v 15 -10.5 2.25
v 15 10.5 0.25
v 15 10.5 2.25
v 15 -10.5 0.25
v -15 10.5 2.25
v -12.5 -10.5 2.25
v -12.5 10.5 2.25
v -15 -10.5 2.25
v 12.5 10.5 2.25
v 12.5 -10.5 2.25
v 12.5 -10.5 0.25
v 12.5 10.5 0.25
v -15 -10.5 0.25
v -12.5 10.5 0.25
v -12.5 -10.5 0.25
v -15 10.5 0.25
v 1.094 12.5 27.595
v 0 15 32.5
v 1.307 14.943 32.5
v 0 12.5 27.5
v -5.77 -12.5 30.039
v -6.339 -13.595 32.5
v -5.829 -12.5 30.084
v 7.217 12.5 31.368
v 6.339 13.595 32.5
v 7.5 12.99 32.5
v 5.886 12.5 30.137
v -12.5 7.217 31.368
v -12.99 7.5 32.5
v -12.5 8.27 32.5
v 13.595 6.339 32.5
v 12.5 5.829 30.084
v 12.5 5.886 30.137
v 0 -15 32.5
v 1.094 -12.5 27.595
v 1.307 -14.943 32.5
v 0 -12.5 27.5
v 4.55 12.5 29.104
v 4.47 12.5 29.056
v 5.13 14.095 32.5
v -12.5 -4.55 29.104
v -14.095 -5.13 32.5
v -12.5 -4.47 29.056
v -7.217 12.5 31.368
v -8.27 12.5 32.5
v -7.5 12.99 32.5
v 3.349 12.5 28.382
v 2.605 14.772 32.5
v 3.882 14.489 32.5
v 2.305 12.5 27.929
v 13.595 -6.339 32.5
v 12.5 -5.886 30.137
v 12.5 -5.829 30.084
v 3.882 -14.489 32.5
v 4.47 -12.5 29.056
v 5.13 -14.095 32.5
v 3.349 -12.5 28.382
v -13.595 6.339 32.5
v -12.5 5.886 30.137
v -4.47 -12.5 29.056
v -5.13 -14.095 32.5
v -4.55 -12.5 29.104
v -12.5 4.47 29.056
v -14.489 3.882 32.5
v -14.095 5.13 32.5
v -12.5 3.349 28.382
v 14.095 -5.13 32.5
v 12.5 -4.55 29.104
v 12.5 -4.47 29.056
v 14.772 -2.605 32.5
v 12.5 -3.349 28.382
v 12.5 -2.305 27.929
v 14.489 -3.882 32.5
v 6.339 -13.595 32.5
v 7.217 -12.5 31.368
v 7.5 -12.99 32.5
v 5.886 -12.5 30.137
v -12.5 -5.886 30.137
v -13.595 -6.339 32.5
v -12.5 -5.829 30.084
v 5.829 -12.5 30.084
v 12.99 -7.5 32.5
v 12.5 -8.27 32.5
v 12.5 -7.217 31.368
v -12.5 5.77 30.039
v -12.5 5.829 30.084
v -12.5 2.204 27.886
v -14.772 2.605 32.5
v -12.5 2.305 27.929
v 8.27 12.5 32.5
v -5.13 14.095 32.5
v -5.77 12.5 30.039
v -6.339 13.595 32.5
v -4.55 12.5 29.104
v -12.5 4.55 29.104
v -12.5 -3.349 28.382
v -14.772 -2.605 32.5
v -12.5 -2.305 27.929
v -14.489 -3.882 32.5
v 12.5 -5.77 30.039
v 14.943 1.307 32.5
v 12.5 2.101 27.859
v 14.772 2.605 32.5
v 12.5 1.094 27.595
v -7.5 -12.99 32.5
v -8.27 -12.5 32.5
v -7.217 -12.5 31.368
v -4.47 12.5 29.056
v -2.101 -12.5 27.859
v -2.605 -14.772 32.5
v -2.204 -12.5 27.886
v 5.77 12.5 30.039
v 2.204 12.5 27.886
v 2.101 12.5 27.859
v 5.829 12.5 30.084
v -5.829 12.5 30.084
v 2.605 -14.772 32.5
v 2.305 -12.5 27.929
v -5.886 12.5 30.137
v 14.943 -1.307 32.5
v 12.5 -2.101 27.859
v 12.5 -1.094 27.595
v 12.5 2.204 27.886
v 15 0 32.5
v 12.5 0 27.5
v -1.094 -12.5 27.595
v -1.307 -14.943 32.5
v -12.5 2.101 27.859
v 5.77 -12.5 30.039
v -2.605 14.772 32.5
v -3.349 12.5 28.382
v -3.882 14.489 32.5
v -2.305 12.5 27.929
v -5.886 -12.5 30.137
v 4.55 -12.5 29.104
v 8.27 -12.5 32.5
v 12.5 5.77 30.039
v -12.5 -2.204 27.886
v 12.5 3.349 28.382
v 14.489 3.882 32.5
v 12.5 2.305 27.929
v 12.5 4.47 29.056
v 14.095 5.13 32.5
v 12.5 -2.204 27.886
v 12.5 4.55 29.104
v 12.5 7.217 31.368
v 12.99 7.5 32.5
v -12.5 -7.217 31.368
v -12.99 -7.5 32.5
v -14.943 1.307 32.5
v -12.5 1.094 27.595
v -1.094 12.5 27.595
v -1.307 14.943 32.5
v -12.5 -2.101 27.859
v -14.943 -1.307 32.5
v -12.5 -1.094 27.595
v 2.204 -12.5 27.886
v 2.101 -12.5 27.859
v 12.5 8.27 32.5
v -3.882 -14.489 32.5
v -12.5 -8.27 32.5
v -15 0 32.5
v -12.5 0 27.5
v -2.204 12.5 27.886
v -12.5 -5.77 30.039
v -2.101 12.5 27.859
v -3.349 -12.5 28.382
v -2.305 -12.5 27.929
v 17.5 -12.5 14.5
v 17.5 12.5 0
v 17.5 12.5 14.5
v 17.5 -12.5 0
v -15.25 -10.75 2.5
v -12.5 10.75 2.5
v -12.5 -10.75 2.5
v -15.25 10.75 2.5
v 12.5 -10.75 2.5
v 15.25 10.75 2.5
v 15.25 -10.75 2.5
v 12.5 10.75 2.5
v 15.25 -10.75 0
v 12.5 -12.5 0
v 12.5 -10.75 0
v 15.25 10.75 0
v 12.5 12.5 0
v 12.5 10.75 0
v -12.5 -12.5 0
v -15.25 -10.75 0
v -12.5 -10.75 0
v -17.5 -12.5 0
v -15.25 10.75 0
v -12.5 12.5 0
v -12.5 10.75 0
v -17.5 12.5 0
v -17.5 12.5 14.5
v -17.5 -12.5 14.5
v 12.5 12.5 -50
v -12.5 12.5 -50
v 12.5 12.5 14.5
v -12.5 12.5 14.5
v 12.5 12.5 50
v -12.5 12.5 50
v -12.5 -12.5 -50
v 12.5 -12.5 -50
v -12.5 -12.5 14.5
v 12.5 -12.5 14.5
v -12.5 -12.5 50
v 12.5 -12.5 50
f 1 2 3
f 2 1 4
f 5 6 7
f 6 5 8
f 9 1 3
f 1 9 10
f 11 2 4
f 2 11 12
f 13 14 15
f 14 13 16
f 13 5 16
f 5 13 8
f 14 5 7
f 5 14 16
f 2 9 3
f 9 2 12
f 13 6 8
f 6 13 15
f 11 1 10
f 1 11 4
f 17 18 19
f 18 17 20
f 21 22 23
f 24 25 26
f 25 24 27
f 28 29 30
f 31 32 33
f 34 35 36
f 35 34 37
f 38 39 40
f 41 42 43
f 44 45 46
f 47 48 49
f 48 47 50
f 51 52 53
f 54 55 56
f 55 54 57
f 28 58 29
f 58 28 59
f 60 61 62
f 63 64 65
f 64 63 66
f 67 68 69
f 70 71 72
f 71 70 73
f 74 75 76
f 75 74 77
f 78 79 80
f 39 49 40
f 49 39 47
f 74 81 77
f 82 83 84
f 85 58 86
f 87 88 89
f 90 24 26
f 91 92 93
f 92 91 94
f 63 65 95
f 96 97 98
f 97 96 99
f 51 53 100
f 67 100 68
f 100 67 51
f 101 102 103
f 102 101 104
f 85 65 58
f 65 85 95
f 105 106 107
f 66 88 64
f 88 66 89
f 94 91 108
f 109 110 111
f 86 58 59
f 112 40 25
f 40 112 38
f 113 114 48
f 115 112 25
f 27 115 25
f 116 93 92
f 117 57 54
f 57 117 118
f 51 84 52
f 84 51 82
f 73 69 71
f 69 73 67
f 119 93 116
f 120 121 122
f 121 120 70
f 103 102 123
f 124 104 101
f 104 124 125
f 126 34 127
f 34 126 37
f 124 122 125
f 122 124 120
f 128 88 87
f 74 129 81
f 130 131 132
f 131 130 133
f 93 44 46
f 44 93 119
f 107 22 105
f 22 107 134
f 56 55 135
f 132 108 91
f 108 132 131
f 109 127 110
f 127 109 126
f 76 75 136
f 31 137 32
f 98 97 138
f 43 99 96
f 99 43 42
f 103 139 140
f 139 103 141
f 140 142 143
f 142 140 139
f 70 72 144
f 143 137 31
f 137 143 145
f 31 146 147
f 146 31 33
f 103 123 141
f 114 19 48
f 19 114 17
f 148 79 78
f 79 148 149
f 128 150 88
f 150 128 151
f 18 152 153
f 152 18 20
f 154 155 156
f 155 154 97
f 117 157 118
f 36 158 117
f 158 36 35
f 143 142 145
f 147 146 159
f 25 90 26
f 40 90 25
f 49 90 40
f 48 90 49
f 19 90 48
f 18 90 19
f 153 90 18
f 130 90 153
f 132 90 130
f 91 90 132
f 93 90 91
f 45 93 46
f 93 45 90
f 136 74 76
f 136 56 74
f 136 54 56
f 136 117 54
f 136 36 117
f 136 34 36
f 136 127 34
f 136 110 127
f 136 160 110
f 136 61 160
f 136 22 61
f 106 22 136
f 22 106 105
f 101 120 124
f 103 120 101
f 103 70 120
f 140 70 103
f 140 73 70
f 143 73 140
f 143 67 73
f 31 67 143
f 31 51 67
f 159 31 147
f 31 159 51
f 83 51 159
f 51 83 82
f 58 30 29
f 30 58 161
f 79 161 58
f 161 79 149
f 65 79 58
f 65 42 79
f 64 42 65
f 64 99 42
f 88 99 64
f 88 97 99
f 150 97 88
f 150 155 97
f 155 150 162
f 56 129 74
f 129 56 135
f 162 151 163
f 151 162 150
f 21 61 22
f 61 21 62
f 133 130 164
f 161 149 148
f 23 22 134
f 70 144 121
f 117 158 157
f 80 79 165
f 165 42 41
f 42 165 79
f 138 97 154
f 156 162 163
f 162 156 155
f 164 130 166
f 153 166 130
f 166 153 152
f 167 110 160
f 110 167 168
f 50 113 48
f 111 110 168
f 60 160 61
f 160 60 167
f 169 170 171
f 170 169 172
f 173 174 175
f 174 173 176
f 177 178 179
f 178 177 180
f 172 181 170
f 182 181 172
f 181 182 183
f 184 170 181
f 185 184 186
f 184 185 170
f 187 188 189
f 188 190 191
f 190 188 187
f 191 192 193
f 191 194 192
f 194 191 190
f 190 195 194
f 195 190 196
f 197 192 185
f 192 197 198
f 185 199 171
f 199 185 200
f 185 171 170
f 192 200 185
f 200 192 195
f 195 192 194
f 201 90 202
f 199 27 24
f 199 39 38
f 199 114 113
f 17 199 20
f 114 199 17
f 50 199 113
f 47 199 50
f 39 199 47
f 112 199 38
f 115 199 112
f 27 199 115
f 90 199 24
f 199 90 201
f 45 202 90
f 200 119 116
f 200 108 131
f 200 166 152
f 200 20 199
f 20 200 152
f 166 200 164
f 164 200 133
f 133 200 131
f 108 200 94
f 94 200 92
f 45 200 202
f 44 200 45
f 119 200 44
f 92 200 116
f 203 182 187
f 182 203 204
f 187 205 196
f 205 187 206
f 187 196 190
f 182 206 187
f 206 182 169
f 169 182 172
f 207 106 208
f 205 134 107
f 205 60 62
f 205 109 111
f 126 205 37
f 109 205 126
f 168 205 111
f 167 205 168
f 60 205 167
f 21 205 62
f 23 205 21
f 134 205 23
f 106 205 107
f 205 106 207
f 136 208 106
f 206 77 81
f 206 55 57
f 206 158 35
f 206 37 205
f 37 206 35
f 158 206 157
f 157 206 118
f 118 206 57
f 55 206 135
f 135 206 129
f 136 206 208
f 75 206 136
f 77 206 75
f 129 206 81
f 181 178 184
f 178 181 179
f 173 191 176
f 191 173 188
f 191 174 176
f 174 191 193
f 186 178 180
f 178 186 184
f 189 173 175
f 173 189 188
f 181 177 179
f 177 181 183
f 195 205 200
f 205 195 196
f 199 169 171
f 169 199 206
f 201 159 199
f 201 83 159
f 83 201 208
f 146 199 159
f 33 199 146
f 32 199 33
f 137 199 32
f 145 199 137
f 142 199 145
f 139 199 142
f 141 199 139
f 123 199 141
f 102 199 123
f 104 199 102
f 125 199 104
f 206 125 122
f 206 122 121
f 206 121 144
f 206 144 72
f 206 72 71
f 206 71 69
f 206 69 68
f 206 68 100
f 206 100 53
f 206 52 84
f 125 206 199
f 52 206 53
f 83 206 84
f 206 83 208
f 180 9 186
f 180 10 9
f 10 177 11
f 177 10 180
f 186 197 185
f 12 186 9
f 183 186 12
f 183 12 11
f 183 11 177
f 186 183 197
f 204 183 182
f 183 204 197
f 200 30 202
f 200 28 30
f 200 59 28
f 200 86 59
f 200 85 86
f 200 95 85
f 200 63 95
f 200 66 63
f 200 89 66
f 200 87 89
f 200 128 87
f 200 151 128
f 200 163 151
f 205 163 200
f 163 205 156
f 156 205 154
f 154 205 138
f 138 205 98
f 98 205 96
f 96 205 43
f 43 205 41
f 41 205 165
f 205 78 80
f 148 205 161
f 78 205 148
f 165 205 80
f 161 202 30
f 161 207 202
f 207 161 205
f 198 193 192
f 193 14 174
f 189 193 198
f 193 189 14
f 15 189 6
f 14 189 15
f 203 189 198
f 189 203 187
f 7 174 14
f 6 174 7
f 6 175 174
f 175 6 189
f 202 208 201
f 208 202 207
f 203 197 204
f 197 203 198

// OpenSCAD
$fn = 72;

color_sensor(view=true);
color_sensor_mount();
color_sensor_mask();

module color_sensor(view=false)
{
    // Main PCB
    color("blue")
    translate([0,0,1.25])
    cube([30, 21, 2], center=true);
    
    // LEDs
    color("white")
    for (xOffset = [-8, 8])
    {
        for (yOffset = [-8, 8])
        {
            translate([xOffset, yOffset, 2.5])
            cylinder(d=6, h=9);
        }
    }
    
    if (view)
    {
        color("red")
        translate([0,0, 2.5 + 10])
        cylinder(d1=10, d2=30, h=20);
    }
}

module color_sensor_mount()
{
    height = 12;
    
    translate([0,0,1.25])
    difference()
    {
        cube([35, 25, 2.5], center=true);
        
        cube([30.5, 21.5, 100], center=true);
    }
    
    translate([0,0,2.5 + height/2])
    difference()
    {
        cube([35, 25, height], center=true);
        
        cube([25, 21.5, 100], center=true);
    }
}

module color_sensor_mask()
{
    cube([25, 25, 100], center=true);
}
